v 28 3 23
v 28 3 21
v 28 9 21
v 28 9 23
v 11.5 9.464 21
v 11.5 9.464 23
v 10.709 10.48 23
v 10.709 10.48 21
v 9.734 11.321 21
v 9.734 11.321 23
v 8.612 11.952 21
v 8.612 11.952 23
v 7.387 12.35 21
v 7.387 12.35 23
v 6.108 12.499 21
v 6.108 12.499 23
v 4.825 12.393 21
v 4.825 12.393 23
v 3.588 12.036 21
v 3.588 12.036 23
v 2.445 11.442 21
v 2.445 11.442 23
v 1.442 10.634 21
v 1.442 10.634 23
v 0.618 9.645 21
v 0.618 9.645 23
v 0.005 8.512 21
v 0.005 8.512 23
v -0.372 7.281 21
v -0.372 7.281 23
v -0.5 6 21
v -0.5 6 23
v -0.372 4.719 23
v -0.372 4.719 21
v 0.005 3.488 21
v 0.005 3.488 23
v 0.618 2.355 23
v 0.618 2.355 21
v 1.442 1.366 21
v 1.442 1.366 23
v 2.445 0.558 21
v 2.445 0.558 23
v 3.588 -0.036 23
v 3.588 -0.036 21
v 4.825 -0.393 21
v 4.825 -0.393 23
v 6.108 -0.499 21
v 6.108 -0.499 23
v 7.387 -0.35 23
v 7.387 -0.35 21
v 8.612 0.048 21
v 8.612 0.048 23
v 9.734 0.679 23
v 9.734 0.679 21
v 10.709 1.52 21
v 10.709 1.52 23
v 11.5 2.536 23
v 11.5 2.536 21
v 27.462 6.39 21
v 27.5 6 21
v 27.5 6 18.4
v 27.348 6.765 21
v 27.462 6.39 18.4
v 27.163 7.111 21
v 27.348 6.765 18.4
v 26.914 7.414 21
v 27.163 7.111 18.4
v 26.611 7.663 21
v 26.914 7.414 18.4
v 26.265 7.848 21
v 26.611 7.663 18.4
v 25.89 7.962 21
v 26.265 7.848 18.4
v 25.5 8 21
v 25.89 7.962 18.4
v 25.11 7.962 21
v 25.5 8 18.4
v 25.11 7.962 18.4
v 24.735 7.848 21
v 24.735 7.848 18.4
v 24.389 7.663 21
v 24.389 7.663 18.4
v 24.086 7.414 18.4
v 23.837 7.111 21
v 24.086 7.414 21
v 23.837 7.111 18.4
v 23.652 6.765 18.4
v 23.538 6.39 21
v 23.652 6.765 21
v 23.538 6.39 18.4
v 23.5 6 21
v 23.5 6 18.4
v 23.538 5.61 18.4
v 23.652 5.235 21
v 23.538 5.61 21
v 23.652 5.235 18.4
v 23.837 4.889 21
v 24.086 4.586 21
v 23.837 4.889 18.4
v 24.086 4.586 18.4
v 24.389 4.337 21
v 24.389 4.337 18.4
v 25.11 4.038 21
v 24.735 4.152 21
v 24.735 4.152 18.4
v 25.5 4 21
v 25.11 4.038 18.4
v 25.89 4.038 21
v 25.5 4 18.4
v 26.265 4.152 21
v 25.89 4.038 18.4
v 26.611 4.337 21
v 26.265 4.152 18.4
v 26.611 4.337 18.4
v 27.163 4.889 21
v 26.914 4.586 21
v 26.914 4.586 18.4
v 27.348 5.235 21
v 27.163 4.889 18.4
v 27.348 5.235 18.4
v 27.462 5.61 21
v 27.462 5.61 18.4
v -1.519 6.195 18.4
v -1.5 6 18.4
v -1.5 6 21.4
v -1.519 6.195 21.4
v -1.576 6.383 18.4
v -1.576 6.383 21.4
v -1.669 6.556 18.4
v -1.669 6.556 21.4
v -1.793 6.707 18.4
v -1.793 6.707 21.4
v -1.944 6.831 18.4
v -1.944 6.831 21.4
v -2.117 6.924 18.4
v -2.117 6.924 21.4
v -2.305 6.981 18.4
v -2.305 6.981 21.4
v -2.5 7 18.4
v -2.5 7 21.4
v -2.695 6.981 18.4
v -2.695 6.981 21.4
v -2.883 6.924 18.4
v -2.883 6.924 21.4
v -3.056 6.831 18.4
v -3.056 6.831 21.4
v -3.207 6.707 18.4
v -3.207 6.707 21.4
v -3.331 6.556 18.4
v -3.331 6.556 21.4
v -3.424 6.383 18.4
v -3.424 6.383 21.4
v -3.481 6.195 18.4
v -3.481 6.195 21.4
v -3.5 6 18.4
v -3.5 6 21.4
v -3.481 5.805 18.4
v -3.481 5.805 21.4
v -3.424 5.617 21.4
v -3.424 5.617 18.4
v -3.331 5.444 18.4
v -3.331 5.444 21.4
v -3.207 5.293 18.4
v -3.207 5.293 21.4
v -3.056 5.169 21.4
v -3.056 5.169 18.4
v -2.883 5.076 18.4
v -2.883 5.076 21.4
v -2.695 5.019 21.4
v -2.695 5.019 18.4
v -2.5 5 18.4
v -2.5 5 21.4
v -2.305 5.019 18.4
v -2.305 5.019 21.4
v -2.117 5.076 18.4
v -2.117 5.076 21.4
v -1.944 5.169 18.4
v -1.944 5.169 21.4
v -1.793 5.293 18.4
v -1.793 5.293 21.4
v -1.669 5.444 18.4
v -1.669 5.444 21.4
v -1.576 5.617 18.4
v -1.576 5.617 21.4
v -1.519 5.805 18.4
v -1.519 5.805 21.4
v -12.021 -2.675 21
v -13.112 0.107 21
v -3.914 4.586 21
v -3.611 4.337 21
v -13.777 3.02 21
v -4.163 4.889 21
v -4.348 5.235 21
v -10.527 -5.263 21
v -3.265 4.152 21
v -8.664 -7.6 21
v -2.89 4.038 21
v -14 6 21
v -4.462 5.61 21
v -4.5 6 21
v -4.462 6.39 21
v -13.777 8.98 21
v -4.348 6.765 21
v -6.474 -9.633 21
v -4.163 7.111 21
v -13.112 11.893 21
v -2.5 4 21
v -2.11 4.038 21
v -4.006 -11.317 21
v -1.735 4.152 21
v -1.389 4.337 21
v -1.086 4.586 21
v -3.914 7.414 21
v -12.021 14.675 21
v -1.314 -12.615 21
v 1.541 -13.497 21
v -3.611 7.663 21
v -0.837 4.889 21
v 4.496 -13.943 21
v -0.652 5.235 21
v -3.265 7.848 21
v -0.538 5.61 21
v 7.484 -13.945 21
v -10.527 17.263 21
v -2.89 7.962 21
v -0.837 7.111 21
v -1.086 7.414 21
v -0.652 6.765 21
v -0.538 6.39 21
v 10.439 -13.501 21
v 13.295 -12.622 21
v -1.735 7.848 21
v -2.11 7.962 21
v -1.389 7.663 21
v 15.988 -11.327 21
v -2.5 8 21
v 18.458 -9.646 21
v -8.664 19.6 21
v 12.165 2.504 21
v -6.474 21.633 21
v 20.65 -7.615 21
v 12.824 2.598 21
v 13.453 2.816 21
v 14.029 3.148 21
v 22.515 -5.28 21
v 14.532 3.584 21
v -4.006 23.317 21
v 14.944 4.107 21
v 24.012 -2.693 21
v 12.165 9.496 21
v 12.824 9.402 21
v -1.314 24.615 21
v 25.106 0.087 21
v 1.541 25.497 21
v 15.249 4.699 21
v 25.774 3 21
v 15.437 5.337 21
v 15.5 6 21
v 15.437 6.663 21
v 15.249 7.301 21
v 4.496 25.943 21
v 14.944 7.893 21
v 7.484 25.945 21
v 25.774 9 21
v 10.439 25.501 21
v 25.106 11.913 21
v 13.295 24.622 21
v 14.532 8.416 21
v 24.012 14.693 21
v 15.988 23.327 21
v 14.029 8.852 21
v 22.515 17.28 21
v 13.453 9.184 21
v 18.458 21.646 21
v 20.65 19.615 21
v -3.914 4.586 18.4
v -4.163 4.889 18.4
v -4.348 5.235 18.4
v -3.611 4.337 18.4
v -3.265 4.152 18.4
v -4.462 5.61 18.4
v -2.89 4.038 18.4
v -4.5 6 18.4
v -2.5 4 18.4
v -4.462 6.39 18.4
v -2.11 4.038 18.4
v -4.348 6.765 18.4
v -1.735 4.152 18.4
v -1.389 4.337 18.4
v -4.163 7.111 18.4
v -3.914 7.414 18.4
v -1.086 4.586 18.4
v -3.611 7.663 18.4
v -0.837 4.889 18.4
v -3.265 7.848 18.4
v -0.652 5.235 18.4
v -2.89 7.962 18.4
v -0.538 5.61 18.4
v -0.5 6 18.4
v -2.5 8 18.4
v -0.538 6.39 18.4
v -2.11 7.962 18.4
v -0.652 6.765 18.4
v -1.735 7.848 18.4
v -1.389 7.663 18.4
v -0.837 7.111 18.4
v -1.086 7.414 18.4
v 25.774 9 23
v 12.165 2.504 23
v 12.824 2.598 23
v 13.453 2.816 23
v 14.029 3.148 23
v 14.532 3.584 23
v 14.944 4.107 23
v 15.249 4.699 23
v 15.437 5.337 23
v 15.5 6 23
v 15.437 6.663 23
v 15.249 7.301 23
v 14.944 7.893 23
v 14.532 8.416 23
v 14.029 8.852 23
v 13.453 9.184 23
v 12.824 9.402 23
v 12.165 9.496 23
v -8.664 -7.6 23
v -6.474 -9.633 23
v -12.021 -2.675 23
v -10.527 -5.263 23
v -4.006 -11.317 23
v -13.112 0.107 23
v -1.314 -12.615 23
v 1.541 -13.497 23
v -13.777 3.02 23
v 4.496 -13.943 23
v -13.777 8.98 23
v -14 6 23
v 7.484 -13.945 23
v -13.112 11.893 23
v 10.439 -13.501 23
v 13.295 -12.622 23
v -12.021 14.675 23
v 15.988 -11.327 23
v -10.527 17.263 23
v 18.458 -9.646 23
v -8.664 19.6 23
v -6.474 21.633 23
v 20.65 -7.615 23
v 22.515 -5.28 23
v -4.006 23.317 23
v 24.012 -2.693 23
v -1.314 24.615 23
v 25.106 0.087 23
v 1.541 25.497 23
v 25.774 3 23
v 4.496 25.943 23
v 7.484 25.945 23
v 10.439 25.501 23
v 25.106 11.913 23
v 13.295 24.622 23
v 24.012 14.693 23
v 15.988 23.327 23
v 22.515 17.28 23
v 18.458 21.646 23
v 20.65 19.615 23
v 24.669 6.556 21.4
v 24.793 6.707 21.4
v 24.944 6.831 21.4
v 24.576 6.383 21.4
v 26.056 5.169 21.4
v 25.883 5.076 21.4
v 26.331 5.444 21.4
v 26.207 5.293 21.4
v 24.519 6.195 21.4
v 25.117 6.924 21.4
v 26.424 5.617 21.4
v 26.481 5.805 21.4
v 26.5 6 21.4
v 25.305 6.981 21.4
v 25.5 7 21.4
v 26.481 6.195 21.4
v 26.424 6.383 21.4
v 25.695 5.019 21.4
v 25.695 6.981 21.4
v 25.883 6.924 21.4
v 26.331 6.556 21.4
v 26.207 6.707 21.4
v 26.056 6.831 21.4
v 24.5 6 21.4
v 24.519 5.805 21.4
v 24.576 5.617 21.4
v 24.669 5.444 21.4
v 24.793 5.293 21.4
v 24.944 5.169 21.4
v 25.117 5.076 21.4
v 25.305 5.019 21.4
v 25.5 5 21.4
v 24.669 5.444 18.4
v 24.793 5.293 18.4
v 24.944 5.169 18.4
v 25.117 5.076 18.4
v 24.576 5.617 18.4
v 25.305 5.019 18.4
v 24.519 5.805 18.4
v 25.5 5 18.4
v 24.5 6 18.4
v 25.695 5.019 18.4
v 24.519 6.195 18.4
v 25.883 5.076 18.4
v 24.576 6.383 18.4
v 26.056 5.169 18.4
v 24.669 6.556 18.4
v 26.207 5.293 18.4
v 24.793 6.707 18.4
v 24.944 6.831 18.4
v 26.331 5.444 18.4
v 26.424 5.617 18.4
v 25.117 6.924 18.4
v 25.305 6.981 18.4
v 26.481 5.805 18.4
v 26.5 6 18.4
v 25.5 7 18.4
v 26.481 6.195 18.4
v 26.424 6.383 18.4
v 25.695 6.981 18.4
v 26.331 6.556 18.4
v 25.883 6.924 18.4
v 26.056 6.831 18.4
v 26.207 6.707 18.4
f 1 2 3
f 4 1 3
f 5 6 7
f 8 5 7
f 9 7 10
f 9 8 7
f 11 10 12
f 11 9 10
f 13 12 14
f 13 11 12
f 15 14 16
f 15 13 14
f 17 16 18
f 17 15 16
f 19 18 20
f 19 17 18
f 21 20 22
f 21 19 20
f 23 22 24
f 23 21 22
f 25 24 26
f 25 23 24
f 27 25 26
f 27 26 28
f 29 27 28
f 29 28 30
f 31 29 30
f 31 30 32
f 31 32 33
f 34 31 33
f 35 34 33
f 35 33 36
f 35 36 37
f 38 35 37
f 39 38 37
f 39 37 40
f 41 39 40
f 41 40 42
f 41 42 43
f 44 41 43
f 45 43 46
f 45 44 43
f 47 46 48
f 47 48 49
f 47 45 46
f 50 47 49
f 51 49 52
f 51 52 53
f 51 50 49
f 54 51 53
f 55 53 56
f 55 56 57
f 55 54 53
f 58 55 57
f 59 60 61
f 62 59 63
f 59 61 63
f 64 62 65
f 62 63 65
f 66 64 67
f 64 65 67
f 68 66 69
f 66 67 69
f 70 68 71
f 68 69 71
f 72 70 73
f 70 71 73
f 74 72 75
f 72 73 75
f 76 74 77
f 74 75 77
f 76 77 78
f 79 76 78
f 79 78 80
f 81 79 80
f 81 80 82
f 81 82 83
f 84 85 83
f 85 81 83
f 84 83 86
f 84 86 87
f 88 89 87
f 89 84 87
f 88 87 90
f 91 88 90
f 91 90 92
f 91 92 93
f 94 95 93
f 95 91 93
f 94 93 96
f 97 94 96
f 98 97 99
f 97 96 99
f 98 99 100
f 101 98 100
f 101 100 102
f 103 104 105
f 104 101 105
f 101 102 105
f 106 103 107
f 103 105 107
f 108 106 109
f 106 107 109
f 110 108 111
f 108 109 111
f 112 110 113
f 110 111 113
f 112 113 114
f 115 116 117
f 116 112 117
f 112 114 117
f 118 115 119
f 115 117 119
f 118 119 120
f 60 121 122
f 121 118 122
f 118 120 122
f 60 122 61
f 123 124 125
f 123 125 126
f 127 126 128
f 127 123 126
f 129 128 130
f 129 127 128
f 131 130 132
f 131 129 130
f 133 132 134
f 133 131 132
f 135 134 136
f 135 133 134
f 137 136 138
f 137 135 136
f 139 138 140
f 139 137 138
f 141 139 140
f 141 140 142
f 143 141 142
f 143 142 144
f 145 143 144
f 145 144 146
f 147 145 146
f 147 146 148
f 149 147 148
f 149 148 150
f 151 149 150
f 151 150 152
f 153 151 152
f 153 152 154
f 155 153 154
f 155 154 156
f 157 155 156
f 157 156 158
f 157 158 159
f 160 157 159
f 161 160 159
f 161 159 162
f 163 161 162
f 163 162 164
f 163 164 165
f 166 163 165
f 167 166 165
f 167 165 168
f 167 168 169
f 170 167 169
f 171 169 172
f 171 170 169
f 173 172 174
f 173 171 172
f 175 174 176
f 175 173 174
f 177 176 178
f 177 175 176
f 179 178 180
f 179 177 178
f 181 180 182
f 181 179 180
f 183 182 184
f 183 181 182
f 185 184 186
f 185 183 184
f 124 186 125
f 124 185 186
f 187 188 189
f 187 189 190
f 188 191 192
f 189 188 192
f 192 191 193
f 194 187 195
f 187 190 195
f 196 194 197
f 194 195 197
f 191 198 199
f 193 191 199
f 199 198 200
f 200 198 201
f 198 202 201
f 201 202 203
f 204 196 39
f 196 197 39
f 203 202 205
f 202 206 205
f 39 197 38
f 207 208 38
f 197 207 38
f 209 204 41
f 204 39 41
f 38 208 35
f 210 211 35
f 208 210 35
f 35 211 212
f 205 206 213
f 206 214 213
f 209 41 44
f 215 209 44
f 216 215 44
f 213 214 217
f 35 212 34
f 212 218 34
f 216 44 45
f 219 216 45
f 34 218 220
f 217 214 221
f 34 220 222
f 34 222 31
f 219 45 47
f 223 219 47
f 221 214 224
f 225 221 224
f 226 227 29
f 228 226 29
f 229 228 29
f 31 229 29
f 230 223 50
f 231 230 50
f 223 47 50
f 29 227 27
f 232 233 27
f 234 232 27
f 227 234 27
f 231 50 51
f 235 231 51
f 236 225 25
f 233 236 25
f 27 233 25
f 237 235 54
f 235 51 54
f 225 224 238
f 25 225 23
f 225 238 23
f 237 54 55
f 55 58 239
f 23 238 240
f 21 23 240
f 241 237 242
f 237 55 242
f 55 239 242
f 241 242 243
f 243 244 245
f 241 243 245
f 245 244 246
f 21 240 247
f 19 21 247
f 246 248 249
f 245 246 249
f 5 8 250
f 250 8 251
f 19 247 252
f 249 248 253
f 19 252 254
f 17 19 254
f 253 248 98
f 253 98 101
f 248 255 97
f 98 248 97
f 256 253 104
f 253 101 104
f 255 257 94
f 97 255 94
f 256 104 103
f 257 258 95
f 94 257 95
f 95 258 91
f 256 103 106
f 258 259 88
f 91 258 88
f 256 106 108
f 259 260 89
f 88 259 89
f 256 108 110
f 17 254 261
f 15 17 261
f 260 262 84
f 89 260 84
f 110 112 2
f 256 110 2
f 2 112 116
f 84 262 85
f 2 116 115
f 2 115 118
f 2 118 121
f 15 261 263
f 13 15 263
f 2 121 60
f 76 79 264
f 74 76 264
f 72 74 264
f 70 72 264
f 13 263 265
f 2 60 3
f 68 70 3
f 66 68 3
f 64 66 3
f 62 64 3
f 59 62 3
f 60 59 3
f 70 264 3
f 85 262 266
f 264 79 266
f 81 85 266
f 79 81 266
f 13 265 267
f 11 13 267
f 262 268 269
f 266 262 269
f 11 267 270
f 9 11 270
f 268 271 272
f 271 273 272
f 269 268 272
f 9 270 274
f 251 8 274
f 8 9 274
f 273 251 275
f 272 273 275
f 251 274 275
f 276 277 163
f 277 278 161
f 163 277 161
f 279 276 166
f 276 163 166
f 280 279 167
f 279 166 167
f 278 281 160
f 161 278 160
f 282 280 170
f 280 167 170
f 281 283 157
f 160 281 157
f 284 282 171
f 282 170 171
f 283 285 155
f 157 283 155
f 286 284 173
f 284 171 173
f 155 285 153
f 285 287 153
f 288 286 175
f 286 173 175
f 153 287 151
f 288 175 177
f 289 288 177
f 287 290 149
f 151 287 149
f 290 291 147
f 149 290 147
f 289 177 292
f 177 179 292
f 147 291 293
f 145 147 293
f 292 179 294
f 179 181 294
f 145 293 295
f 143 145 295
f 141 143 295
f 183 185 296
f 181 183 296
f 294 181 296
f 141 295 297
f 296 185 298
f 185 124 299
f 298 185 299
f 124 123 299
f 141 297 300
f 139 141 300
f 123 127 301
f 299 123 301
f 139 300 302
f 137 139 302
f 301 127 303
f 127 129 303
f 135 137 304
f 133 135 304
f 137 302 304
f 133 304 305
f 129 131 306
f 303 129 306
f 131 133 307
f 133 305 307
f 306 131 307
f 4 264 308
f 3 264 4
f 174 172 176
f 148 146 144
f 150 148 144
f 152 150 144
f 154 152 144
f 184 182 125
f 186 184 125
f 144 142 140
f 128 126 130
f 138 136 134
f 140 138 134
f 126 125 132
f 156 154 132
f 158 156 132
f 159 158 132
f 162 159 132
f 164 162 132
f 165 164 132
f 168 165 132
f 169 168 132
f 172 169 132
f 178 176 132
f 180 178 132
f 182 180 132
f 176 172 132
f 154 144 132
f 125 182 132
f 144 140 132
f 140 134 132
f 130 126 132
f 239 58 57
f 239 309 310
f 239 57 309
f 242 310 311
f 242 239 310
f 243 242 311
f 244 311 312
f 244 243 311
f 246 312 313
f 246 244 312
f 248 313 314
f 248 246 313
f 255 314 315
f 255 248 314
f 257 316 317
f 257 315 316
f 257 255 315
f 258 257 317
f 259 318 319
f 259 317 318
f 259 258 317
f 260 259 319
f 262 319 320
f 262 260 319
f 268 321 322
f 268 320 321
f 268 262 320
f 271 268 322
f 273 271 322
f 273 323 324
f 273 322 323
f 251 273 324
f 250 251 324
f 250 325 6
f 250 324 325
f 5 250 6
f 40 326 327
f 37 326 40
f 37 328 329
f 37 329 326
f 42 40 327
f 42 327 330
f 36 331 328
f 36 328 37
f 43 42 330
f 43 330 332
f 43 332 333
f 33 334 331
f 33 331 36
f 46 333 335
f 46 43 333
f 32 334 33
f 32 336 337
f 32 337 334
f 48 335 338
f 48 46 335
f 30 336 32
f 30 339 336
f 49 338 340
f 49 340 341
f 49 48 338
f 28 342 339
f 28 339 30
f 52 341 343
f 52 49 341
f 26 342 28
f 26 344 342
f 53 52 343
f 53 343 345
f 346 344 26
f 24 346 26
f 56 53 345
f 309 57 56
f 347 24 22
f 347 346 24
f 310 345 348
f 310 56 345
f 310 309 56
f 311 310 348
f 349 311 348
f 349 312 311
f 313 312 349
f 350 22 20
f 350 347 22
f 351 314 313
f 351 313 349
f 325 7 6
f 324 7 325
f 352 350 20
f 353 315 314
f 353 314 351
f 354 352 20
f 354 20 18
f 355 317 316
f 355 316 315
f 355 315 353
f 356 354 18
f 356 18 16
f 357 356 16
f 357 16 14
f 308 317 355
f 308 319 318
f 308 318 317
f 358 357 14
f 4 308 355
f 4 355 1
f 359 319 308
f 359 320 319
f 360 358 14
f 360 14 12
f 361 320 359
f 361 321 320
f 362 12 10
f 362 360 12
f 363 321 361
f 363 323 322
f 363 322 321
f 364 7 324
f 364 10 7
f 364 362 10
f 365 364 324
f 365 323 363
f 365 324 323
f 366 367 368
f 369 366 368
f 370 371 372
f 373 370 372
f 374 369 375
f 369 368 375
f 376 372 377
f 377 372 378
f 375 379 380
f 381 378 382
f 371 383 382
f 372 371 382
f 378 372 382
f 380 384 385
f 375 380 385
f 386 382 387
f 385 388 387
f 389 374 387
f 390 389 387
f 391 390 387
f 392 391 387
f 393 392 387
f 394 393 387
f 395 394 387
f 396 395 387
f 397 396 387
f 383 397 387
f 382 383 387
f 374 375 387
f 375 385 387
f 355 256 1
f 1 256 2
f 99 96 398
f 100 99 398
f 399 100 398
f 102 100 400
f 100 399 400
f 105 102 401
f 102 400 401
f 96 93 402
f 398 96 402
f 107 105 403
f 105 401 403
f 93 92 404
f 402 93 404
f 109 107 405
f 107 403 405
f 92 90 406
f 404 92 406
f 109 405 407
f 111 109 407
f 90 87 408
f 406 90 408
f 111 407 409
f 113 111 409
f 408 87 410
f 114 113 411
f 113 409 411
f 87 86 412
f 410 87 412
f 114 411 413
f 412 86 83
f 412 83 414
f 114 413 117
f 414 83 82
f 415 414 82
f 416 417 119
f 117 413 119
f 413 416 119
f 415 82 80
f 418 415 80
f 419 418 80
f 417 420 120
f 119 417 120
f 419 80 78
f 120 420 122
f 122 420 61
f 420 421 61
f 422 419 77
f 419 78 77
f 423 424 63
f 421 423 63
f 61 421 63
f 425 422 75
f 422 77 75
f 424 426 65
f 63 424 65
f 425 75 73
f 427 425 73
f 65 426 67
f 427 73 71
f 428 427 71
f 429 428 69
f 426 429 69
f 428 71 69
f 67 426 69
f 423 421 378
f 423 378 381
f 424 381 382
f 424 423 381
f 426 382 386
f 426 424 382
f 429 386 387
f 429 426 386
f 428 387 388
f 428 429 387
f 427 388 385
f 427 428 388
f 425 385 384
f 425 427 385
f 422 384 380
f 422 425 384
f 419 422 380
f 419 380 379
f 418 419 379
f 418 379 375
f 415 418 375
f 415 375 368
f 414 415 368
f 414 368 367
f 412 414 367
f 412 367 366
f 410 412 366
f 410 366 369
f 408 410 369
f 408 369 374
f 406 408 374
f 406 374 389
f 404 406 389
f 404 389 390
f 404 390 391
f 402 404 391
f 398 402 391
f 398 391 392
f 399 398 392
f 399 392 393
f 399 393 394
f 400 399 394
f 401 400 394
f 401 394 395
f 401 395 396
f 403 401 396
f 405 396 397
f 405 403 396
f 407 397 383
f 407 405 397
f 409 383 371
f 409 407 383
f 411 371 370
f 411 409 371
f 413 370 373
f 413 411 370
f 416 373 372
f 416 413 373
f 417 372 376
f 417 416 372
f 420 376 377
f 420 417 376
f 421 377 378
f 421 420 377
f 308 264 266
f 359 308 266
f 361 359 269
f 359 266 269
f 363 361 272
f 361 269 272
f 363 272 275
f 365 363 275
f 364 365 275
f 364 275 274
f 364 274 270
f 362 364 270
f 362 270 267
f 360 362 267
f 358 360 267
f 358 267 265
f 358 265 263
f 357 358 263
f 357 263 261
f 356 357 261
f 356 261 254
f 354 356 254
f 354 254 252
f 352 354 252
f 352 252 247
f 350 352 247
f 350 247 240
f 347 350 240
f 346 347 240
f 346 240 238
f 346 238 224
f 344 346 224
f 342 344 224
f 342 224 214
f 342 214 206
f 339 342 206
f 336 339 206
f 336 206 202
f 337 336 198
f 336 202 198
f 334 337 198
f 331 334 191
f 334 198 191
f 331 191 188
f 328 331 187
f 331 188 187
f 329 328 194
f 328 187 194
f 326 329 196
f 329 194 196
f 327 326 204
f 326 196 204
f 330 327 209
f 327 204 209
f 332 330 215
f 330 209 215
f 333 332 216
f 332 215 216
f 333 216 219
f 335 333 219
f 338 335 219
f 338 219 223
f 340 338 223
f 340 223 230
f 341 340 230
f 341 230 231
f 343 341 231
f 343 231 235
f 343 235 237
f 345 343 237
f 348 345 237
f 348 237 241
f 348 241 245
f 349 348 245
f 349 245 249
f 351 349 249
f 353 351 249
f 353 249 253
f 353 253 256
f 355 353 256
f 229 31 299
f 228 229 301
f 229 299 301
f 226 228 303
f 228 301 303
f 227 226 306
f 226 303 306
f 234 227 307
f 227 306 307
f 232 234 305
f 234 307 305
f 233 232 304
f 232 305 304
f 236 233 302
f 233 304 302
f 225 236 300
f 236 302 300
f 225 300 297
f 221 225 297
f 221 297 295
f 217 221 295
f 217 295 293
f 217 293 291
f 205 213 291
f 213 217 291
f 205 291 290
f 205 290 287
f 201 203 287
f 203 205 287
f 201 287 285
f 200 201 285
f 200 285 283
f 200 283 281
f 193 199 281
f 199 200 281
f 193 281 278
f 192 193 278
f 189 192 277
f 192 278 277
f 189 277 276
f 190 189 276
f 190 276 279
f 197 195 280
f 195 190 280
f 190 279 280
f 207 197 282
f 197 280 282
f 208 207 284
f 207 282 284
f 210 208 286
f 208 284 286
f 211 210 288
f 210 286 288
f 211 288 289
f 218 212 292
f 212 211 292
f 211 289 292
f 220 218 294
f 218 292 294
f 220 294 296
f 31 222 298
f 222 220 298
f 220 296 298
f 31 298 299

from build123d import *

# Parameters (mm, degrees)
CYLINDER003001001005001001_R     = 3.5
CYLINDER003001001005001001_DEPTH = 2
CYLINDER003001001004002_R        = 1
CYLINDER003001001004002_DEPTH    = 5
CYLINDER003001001004001001_R     = 1
CYLINDER003001001004001001_DEPTH = 5
CYLINDER003001001005001_R        = 6.5
CYLINDER003001001005001_DEPTH    = 2
BOX002_W                         = 10
BOX002_H                         = 6
BOX002_DEPTH                     = 2
CYLINDER003001001004_R           = 2
CYLINDER003001001004_DEPTH       = 3
CYLINDER003001001004001_R        = 2
CYLINDER003001001004001_DEPTH    = 3
CYLINDER003001001005_R           = 20
CYLINDER003001001005_DEPTH       = 2


with BuildPart() as cylinder013:
    # Cylinder003001001005001001 → Cylinder003001001005001001 (new body)
    with BuildSketch(Plane(origin=(12, 6, 21), x_dir=(1, 0, 0), z_dir=(0, 0, 1))):
        Circle(CYLINDER003001001005001001_R)
    extrude(amount=CYLINDER003001001005001001_DEPTH)


with BuildPart() as cylinder014:
    # Cylinder003001001004002 → Cylinder003001001004002 (new body)
    with BuildSketch(Plane(origin=(-2.5, 6, 16.4), x_dir=(1, 0, 0), z_dir=(0, 0, 1))):
        Circle(CYLINDER003001001004002_R)
    extrude(amount=CYLINDER003001001004002_DEPTH)


with BuildPart() as cylinder015:
    # Cylinder003001001004001001 → Cylinder003001001004001001 (new body)
    with BuildSketch(Plane(origin=(25.5, 6, 16.4), x_dir=(1, 0, 0), z_dir=(0, 0, 1))):
        Circle(CYLINDER003001001004001001_R)
    extrude(amount=CYLINDER003001001004001001_DEPTH)


with BuildPart() as fusion009:
    # Cylinder003001001005001 → Cylinder003001001005001 (new body)
    with BuildSketch(Plane(origin=(6, 6, 21), x_dir=(1, 0, 0), z_dir=(0, 0, 1))):
        Circle(CYLINDER003001001005001_R)
    extrude(amount=CYLINDER003001001005001_DEPTH)

    # Fusion009: union Cylinder013, Cylinder014, Cylinder015
    add(cylinder013.part)
    add(cylinder014.part)
    add(cylinder015.part)


with BuildPart() as box002:
    # Box002 → Box002 (new body)
    with BuildSketch(Plane(origin=(18, 3, 21), x_dir=(1, 0, 0), z_dir=(0, 0, 1))):
        with Locations((5, 3)):
            Rectangle(BOX002_W, BOX002_H)
    extrude(amount=BOX002_DEPTH)


with BuildPart() as cylinder009:
    # Cylinder003001001004 → Cylinder003001001004 (new body)
    with BuildSketch(Plane(origin=(-2.5, 6, 18.4), x_dir=(1, 0, 0), z_dir=(0, 0, 1))):
        Circle(CYLINDER003001001004_R)
    extrude(amount=CYLINDER003001001004_DEPTH)


with BuildPart() as cylinder010:
    # Cylinder003001001004001 → Cylinder003001001004001 (new body)
    with BuildSketch(Plane(origin=(25.5, 6, 18.4), x_dir=(1, 0, 0), z_dir=(0, 0, 1))):
        Circle(CYLINDER003001001004001_R)
    extrude(amount=CYLINDER003001001004001_DEPTH)


with BuildPart() as guide1:
    # Cylinder003001001005 → Cylinder003001001005 (new body)
    with BuildSketch(Plane(origin=(6, 6, 21), x_dir=(1, 0, 0), z_dir=(0, 0, 1))):
        Circle(CYLINDER003001001005_R)
    extrude(amount=CYLINDER003001001005_DEPTH)

    # Fusion008: union Box002, Cylinder009, Cylinder010
    add(box002.part)
    add(cylinder009.part)
    add(cylinder010.part)

    # Cut002: cut Fusion009
    add(fusion009.part, mode=Mode.SUBTRACT)


solid = guide1.part
